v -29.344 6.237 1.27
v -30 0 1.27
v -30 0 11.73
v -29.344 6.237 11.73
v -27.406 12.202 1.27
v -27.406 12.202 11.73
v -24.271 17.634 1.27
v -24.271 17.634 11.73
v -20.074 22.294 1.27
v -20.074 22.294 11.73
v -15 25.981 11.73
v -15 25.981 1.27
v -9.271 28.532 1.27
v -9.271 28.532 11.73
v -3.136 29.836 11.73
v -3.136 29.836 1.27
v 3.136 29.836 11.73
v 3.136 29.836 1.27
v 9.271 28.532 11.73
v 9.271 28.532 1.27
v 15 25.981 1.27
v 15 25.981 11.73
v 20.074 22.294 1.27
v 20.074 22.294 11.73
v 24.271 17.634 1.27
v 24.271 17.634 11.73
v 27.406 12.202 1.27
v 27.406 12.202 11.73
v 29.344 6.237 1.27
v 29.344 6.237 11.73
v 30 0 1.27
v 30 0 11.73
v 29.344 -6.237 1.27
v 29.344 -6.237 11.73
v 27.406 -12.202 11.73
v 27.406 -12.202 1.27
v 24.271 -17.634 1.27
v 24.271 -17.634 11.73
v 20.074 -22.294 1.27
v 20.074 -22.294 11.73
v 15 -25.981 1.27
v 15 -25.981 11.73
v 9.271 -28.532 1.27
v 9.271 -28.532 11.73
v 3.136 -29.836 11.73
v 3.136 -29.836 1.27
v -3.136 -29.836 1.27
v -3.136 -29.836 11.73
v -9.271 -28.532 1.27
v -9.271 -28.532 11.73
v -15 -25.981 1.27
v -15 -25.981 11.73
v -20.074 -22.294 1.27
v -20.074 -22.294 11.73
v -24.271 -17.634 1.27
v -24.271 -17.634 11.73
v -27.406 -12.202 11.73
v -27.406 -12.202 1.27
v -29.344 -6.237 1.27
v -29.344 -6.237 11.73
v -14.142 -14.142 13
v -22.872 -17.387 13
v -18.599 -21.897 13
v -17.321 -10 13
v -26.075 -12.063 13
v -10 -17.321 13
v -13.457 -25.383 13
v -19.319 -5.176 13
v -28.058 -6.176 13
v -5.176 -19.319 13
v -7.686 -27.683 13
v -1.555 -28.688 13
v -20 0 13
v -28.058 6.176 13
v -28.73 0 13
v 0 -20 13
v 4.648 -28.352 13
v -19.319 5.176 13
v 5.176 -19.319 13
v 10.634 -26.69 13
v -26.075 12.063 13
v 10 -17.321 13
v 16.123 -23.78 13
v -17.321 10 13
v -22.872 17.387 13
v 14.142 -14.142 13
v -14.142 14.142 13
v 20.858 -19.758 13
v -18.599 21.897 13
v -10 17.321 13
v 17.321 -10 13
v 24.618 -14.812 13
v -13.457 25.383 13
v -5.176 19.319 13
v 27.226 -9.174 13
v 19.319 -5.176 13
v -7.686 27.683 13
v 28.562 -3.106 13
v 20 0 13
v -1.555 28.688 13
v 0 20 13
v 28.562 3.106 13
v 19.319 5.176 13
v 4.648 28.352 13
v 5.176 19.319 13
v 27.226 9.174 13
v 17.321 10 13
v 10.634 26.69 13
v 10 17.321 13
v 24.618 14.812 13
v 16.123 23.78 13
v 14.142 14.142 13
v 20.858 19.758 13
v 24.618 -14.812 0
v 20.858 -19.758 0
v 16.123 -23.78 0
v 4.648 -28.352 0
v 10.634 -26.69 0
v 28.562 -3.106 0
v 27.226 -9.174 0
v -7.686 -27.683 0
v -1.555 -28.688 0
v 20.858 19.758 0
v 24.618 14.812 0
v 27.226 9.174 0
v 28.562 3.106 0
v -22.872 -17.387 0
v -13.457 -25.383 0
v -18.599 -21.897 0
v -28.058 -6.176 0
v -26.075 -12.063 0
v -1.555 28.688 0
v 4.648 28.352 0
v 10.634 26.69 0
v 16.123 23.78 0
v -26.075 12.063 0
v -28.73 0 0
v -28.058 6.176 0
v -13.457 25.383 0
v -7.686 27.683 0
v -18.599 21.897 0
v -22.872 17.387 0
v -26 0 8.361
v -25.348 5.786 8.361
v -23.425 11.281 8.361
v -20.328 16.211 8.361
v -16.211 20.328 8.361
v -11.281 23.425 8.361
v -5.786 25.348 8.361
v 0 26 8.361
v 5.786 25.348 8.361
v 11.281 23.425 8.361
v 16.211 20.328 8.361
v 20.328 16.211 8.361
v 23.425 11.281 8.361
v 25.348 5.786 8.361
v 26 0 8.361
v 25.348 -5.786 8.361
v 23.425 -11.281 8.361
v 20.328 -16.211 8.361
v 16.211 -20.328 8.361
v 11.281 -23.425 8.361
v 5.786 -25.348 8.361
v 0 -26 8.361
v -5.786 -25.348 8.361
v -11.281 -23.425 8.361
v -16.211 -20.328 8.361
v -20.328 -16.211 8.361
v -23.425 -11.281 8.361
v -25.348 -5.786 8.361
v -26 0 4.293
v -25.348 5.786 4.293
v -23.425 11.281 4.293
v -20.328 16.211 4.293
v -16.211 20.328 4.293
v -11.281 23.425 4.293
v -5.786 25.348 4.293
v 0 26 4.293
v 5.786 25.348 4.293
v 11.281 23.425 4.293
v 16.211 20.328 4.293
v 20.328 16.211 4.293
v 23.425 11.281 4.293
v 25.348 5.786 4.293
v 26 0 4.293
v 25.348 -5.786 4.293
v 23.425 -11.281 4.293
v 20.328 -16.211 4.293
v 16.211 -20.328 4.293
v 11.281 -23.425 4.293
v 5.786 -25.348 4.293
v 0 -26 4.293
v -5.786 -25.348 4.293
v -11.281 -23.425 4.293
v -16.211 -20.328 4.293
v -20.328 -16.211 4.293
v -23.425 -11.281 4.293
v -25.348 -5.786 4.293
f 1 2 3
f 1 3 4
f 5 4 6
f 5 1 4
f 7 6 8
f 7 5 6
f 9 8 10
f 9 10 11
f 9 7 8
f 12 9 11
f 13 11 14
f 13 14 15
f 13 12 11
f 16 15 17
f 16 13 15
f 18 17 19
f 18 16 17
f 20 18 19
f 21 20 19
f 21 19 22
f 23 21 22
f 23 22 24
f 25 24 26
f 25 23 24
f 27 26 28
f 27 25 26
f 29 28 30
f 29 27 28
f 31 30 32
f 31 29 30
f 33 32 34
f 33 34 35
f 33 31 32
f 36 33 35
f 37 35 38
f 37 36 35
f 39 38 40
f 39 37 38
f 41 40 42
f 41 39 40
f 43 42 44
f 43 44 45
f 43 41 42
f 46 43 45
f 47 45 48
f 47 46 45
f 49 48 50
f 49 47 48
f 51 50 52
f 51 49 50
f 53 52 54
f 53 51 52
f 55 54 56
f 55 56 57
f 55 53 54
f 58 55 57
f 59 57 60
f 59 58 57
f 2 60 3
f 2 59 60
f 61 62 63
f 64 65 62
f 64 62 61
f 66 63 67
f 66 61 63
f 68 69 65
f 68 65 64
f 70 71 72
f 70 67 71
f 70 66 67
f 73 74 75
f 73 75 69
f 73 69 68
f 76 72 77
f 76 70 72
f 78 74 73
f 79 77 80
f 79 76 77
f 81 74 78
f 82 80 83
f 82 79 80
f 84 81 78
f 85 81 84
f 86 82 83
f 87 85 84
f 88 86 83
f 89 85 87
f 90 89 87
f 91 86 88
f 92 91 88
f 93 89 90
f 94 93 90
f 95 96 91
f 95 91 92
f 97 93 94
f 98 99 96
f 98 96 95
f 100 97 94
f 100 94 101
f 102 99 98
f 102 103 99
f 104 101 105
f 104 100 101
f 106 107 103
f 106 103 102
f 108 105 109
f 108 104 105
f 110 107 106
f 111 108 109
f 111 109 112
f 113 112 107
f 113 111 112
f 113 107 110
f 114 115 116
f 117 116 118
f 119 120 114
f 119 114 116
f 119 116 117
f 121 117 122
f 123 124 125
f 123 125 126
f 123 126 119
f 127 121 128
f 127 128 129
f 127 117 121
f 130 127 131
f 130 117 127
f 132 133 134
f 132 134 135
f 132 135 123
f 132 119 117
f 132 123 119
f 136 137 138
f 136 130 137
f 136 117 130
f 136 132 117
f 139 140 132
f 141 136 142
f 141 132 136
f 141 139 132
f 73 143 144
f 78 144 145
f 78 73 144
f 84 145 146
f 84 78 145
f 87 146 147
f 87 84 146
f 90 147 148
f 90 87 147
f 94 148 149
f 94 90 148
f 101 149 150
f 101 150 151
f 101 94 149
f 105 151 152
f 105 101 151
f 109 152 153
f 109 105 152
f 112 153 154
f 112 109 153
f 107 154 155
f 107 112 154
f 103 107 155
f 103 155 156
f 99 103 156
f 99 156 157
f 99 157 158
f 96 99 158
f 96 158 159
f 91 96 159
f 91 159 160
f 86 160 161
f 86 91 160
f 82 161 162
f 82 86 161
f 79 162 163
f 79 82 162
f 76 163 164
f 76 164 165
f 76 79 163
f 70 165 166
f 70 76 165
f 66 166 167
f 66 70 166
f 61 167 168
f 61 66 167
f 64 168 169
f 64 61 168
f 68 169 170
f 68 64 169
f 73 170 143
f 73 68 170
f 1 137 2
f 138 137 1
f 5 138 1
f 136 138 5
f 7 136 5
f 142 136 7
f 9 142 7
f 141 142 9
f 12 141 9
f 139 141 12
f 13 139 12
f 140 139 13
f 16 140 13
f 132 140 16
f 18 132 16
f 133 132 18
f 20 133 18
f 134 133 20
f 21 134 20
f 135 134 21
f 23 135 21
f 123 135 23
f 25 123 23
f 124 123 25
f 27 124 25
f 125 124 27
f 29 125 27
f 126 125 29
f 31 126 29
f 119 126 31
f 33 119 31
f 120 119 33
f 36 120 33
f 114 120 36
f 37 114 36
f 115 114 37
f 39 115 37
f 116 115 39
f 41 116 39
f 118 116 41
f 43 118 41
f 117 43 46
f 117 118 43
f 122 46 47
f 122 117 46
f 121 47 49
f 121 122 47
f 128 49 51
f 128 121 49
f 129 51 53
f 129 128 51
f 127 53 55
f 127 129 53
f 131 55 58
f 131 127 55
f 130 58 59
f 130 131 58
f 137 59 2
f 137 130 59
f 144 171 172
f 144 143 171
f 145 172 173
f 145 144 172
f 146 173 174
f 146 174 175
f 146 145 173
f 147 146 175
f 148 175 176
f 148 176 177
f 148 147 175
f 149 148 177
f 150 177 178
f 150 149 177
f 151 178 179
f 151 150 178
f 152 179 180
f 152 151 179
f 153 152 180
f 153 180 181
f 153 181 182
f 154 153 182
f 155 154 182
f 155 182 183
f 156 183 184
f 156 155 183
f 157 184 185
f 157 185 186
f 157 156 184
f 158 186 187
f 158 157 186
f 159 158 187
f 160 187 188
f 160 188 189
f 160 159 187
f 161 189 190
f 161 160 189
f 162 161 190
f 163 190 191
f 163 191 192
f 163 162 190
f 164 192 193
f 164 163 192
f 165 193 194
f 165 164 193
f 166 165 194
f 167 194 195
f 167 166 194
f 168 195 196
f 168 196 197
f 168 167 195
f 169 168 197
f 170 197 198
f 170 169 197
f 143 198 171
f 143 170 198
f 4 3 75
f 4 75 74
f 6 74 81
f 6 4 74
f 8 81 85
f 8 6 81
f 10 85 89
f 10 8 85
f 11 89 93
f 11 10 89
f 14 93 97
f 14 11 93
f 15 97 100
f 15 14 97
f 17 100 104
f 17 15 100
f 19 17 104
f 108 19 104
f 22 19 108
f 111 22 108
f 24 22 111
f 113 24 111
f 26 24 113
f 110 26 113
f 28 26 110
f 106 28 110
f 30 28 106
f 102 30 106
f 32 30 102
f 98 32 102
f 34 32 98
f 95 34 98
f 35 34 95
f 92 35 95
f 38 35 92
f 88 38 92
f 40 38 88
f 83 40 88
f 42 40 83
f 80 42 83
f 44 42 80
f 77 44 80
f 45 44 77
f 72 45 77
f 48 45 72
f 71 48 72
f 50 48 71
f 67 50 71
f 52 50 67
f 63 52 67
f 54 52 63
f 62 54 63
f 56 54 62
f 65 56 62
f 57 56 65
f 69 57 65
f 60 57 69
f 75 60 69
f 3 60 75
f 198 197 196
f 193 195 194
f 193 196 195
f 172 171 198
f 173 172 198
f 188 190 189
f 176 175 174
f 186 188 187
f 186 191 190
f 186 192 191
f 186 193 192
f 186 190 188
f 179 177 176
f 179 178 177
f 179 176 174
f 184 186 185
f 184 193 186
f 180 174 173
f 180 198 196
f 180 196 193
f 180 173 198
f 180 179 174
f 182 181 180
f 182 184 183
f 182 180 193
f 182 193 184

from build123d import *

# Parameters (mm, degrees)
F2_SIZE = 1.27
F3_SIZE = 1.27


with BuildPart() as f1:
    # F0 (on Front) → F1 (revolve)
    with BuildSketch(Plane.XZ):
        Polygon((-30, 0), (0, 0), (0, 4.293243), (-26, 4.293243), (-26, 8.360523), (-20, 13), (-30, 13), align=None)
    revolve(axis=Axis((0, 0, 2.146621), (0, 0, -1)))

    # F2
    f2_edges = [f1.edges().sort_by_distance(p)[0] for p in [
        (30, 0, 13),
    ]]
    chamfer(f2_edges, length=F2_SIZE)

    # F3
    f3_edges = [f1.edges().sort_by_distance(p)[0] for p in [
        (30, 0, 0),
    ]]
    chamfer(f3_edges, length=F3_SIZE)


solid = f1.part
